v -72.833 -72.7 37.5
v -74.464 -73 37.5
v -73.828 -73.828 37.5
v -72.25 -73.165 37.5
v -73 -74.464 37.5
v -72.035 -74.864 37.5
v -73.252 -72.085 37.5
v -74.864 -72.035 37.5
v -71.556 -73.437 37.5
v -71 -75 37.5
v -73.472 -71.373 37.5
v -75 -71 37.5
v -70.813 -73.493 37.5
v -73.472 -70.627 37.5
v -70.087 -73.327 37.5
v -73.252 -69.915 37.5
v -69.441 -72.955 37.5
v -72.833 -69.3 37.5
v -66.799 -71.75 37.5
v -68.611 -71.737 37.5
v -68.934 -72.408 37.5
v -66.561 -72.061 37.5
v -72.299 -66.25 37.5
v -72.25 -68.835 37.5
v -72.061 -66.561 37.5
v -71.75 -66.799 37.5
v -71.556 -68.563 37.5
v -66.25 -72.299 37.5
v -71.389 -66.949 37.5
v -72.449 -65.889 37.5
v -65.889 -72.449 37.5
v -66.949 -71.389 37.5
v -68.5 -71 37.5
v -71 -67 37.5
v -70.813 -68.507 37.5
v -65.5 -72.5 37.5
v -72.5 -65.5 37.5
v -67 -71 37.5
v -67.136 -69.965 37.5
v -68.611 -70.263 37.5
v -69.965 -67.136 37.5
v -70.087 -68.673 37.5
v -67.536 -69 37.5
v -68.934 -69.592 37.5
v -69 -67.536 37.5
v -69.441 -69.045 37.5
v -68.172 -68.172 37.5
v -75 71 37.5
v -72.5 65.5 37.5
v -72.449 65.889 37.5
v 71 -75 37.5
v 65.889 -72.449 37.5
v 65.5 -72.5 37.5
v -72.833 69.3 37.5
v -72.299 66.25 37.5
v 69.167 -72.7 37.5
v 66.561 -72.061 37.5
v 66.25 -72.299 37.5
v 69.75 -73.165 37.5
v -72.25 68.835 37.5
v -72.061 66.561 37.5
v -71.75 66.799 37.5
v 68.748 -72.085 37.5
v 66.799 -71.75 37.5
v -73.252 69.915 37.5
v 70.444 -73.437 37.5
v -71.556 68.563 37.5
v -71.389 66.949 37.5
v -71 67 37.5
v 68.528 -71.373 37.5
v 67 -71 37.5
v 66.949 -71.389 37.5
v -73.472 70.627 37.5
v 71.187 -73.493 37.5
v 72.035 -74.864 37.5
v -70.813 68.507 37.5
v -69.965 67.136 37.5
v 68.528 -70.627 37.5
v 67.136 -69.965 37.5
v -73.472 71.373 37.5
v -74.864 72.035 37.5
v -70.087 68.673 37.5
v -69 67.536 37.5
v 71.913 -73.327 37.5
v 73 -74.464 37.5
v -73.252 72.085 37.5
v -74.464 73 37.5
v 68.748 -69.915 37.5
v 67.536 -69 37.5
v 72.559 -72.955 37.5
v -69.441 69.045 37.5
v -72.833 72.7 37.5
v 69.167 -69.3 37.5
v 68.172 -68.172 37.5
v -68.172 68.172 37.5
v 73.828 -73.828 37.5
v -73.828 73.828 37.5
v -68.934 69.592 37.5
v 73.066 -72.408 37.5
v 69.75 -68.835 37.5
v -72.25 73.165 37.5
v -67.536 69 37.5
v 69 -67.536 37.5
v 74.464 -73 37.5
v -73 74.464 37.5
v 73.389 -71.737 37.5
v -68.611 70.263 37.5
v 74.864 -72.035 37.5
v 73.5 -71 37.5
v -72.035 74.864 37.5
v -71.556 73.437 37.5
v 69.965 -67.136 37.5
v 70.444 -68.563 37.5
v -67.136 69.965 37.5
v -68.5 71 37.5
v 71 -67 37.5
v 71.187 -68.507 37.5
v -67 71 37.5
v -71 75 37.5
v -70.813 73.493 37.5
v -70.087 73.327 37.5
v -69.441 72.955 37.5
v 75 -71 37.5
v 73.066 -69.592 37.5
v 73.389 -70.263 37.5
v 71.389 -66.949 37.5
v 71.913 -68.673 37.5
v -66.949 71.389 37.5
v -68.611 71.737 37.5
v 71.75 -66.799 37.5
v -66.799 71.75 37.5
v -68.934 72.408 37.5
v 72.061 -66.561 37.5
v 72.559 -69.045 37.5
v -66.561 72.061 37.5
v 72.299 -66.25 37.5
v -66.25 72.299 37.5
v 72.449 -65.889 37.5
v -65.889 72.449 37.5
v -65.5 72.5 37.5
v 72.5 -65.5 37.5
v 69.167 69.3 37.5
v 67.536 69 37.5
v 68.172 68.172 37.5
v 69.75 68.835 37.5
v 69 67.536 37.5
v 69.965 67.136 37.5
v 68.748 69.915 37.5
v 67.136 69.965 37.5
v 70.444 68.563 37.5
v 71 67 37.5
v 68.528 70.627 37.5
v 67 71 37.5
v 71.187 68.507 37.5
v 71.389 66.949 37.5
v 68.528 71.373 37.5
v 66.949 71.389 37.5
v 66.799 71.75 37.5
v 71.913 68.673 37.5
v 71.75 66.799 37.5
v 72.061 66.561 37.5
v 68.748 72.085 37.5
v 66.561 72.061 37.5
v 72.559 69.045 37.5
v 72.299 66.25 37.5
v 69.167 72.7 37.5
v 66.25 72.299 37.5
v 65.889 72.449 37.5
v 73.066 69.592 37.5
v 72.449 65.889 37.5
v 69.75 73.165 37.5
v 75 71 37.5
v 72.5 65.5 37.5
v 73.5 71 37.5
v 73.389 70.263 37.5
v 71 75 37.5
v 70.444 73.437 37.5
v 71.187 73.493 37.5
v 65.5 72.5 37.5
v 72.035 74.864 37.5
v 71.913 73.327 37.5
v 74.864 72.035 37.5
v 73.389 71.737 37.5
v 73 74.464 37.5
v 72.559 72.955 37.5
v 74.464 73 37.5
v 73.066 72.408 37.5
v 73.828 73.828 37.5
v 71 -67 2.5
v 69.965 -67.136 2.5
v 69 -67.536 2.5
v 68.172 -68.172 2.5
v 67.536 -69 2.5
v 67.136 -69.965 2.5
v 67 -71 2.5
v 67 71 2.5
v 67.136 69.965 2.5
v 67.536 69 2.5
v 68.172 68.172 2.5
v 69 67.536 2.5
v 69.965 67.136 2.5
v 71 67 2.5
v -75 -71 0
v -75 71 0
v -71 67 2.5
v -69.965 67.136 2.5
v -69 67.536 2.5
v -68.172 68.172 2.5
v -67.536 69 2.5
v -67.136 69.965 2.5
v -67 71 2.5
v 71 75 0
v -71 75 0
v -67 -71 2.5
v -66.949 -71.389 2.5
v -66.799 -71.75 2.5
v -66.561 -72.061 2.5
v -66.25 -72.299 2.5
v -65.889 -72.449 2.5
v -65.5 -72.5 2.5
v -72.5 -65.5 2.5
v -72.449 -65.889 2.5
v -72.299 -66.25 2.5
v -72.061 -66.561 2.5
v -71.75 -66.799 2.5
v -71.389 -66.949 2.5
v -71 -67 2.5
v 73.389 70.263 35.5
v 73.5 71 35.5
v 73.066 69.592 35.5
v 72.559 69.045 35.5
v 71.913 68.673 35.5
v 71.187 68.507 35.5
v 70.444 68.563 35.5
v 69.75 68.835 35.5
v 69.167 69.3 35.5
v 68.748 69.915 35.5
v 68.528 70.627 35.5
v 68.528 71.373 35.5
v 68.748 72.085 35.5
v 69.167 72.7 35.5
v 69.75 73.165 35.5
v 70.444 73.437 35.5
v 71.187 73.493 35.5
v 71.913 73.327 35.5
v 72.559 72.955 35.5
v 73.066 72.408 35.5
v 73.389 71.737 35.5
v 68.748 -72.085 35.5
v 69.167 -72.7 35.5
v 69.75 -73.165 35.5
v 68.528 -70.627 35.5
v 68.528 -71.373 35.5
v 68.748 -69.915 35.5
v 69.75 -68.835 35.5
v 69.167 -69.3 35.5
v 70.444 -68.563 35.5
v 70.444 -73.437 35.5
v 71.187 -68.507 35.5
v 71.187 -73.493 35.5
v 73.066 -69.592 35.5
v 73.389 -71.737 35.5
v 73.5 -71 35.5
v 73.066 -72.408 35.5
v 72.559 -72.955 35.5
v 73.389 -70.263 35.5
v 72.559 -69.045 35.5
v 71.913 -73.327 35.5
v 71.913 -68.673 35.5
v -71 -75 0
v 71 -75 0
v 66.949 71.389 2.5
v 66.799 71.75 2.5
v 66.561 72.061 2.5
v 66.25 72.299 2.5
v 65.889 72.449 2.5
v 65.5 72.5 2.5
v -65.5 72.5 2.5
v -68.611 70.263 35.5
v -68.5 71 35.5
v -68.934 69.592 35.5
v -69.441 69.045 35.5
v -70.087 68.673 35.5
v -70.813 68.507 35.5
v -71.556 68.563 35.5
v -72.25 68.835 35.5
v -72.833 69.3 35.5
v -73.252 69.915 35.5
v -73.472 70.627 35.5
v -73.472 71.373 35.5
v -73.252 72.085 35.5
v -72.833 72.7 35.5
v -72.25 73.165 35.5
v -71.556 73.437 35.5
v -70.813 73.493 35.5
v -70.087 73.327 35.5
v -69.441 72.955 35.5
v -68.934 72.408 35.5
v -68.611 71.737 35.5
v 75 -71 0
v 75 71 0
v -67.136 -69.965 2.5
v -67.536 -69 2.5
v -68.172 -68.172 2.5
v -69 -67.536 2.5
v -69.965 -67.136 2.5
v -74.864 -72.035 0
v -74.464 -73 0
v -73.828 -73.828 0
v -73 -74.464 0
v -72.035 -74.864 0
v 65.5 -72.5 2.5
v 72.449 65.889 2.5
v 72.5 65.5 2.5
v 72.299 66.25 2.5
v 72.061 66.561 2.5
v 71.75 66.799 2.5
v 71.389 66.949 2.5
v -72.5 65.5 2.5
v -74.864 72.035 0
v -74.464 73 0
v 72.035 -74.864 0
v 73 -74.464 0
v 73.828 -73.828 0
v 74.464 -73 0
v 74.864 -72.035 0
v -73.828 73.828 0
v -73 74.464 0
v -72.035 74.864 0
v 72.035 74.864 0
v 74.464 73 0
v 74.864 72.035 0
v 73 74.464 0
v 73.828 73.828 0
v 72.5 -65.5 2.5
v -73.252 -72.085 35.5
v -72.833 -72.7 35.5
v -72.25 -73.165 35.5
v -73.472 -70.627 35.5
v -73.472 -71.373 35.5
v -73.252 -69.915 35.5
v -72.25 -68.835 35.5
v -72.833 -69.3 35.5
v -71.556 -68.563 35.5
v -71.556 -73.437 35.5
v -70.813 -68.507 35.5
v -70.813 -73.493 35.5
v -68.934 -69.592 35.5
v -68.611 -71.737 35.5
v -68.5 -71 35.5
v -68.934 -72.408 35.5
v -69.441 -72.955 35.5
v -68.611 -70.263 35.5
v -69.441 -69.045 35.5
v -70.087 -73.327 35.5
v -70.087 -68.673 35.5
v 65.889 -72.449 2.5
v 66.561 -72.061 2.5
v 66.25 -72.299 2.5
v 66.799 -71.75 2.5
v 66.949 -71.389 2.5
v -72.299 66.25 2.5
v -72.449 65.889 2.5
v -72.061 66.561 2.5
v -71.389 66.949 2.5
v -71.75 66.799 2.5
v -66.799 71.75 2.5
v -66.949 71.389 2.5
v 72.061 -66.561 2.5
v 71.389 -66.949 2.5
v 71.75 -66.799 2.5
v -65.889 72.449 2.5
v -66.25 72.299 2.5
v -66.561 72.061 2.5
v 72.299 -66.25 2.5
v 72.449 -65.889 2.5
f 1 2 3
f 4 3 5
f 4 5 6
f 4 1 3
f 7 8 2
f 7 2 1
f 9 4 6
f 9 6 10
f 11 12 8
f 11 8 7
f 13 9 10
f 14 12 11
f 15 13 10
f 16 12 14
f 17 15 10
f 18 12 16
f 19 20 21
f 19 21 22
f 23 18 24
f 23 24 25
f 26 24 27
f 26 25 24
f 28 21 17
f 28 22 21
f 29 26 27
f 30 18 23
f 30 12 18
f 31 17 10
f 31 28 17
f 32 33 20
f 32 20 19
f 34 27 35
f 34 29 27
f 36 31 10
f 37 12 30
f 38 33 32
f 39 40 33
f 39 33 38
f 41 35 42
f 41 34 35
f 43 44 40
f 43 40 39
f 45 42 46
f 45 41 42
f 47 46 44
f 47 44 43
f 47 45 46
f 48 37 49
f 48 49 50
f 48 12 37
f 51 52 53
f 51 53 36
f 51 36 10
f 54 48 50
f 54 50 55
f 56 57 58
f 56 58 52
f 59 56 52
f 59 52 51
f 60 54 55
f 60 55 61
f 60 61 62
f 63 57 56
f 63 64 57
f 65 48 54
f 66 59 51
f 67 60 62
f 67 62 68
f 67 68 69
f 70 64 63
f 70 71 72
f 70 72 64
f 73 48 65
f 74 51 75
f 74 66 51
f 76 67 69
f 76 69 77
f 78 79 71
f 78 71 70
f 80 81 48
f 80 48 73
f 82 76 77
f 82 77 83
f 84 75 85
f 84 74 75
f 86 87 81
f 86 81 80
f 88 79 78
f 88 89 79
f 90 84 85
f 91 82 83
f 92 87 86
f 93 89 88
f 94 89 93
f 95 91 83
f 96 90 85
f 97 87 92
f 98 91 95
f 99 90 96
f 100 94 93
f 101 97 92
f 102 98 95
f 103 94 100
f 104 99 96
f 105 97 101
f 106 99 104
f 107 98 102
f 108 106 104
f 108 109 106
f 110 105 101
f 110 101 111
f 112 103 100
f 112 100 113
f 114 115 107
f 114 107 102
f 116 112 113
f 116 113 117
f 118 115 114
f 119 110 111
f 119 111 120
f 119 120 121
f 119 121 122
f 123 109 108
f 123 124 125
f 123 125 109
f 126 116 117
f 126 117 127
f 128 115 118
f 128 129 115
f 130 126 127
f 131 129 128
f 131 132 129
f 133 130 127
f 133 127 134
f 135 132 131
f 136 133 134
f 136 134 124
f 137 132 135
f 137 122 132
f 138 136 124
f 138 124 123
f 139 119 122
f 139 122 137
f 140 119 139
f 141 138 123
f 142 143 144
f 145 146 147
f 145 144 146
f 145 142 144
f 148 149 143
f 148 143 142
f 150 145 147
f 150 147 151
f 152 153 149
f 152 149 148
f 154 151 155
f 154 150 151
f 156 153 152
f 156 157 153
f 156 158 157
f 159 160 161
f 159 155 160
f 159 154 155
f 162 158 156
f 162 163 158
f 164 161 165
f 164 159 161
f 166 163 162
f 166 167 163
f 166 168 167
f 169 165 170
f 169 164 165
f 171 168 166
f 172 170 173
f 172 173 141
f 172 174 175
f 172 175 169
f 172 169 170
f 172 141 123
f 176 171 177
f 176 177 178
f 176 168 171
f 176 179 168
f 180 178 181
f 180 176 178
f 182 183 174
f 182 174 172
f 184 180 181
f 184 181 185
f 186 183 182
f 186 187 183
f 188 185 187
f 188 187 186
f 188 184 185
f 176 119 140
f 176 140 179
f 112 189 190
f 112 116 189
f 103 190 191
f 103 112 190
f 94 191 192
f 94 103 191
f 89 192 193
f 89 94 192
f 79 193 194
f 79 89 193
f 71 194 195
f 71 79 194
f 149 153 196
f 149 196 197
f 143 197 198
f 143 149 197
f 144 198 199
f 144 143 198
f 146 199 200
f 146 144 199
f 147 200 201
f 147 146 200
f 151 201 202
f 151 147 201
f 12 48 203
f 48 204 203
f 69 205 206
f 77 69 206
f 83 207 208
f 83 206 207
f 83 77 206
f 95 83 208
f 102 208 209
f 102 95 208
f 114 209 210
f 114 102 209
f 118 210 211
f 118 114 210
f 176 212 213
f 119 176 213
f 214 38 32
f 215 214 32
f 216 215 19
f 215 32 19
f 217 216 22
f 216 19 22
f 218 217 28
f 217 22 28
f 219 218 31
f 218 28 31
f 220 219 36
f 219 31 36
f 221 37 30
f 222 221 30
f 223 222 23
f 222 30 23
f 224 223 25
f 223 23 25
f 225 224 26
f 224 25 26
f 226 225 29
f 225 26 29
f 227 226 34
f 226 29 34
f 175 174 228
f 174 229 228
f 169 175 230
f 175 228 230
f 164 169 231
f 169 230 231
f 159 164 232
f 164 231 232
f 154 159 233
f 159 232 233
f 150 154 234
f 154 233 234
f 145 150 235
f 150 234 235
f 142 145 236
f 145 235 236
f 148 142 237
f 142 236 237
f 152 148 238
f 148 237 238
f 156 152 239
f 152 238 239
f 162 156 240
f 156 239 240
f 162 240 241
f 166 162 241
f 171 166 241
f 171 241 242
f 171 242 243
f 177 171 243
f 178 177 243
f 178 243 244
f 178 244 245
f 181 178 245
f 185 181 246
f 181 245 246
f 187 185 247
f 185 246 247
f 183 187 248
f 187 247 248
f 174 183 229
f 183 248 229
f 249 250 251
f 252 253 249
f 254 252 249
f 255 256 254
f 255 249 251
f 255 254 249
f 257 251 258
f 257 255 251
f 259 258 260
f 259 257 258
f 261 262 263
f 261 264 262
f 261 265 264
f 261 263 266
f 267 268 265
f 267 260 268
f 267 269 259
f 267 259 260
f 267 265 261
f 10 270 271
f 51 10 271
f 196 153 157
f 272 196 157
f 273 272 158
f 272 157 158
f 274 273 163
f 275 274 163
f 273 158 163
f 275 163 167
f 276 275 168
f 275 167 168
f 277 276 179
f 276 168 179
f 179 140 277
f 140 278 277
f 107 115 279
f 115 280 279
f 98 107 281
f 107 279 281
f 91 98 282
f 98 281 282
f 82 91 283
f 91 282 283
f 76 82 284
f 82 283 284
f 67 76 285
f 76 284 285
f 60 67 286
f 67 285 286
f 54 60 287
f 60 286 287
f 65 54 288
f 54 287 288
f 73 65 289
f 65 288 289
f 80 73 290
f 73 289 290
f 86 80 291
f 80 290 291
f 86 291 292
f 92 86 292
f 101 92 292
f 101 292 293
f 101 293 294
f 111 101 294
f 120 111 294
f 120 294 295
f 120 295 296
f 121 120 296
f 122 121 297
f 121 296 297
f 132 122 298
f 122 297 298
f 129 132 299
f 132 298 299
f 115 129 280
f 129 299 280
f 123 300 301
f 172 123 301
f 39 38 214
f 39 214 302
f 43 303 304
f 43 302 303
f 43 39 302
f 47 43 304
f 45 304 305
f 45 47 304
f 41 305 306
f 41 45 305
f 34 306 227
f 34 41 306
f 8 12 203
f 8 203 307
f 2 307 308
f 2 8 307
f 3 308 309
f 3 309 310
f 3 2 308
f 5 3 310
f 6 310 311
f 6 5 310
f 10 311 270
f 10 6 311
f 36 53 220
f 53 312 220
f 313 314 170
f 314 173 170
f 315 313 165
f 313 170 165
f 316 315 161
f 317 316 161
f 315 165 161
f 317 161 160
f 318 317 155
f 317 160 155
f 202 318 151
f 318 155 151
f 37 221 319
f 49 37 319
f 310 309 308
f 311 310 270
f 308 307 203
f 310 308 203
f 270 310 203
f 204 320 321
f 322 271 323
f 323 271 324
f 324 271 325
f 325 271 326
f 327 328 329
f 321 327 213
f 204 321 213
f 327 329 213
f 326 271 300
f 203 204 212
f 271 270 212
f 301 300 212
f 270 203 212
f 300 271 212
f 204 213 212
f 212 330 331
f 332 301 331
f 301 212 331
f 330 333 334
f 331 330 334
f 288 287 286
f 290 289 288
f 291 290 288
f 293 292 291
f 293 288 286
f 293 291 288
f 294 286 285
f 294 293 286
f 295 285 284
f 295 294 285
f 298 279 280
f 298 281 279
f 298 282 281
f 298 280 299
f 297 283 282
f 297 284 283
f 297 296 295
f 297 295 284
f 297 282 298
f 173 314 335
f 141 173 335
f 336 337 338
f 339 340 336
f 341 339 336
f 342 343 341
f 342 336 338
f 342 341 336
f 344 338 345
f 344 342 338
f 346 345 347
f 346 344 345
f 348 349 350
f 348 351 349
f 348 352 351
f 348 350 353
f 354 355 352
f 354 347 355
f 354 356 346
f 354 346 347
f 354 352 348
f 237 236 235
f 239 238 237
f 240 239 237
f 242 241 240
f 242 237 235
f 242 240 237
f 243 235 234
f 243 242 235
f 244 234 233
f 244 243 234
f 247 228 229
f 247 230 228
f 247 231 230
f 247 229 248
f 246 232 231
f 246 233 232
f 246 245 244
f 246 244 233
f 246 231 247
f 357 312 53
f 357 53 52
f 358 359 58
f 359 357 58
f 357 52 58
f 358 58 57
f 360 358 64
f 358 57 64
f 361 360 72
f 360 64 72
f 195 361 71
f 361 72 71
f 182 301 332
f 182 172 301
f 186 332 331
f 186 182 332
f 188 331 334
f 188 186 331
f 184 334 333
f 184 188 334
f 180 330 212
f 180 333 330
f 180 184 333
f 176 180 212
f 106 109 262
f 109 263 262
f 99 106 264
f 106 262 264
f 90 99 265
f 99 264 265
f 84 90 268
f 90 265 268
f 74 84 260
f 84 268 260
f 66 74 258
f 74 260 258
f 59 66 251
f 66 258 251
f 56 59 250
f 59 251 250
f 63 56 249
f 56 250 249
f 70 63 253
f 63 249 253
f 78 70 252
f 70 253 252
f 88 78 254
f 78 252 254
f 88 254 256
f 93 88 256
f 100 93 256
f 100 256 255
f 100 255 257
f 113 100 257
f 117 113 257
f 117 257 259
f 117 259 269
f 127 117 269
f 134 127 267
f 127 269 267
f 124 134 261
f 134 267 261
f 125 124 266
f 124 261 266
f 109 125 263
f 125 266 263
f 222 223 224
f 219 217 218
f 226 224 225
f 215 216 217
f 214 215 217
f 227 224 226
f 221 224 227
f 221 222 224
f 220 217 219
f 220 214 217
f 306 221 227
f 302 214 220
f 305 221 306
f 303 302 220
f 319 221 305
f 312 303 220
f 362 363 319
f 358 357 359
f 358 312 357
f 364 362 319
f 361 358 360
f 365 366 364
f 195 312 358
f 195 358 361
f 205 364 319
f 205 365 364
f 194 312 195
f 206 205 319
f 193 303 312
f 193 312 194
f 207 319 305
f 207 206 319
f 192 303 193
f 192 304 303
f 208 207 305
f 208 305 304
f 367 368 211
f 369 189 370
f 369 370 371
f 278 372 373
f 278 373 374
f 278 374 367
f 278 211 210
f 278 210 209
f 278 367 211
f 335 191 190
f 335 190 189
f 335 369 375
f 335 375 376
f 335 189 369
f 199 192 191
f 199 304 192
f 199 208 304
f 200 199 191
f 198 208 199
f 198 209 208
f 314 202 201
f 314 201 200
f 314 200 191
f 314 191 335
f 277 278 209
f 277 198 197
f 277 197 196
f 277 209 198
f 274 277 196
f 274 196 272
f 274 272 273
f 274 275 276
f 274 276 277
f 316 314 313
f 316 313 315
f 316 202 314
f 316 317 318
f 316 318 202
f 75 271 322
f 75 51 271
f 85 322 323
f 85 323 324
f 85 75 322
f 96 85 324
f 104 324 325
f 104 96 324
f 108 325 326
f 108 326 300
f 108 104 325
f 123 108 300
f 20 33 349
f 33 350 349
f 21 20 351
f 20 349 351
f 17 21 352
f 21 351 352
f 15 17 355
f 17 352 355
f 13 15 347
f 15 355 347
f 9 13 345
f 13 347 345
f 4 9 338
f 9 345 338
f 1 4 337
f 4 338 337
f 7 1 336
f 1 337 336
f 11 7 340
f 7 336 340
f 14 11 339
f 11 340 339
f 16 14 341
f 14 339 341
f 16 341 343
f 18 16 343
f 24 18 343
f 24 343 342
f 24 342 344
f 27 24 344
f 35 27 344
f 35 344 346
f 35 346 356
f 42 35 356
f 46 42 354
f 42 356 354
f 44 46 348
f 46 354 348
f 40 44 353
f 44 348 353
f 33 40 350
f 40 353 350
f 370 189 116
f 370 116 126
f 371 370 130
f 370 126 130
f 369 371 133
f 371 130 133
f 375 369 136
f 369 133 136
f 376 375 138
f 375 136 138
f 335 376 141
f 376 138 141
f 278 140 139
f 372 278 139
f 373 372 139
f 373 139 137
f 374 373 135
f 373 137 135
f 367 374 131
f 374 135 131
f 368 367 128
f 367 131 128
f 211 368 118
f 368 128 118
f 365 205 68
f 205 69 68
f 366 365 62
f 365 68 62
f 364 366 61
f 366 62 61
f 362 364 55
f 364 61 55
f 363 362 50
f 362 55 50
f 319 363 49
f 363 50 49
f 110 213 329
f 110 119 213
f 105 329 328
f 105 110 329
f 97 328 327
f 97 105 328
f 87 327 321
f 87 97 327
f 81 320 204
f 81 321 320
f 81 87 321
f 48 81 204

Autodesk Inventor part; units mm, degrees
ref_plane "YZ Plane" through (0, 0, 0) normal (1, 0, 0) x (0, 1, 0)
ref_plane "XZ Plane" through (0, 0, 0) normal (0, 1, 0) x (-1, 0, 0)
ref_plane "XY Plane" through (0, 0, 0) normal (0, 0, 1) x (1, 0, 0)
sketch "Sketch1" plane through (0, 0, 0) normal (0, 0, 1) x (1, 0, 0)
  line L0 (-75, -75) -> (75, -75)
  line L1 (75, -75) -> (75, 75)
  line L2 (75, 75) -> (-75, 75)
  line L3 (-75, 75) -> (-75, -75)
  line L4 (-75, -75) -> (75, 75) construction
  line L5 (75, -75) -> (-75, 75) construction
  line L6 (72.5, -72.5) -> (-72.5, -72.5)
  line L7 (-72.5, -72.5) -> (-72.5, 72.5)
  line L8 (-72.5, 72.5) -> (72.5, 72.5)
  line L9 (72.5, 72.5) -> (72.5, -72.5)
  line L10 (72.5, -72.5) -> (-72.5, 72.5) construction
  line L11 (-72.5, -72.5) -> (72.5, 72.5) construction
  line L12 (-75, 75) -> (-71, 75) construction
  line L13 (-71, 75) -> (-71, 71) construction
  line L14 (-71, 71) -> (-75, 71) construction
  line L15 (-75, 71) -> (-75, 75) construction
  circle A0 centre (-71, 71) radius 2.5
  line L16 (-71, -71) -> (-71, -75) construction
  line L17 (-75, -71) -> (-71, -71) construction
  circle A1 centre (-71, -71) radius 2.5
  line L18 (72.5, 72.5) -> (-72.5, -72.5) construction
  line L19 (75, 75) -> (-75, -75) construction
  line L20 (71, -71) -> (75, -71) construction
  line L21 (71, -75) -> (71, -71) construction
  circle A2 centre (71, -71) radius 2.5
  line L22 (-72.5, 72.5) -> (72.5, -72.5) construction
  line L23 (-75, 75) -> (75, -75) construction
  line L24 (71, 71) -> (71, 75) construction
  line L25 (75, 71) -> (71, 71) construction
  circle A3 centre (71, 71) radius 2.5
  line L26 (-72.5, -72.5) -> (72.5, 72.5) construction
  line L27 (-75, -75) -> (75, 75) construction
  line L28 (-73.5, 73.5) -> (-68.5, 73.5)
  line L29 (-68.5, 73.5) -> (-68.5, 68.5)
  line L30 (-68.5, 68.5) -> (-73.5, 68.5)
  line L31 (-73.5, 68.5) -> (-73.5, 73.5)
  line L32 (-73.5, 73.5) -> (-68.5, 68.5) construction
  line L33 (-68.5, 73.5) -> (-73.5, 68.5) construction
  line L34 (-72.5, -72.5) -> (72.5, 72.5) construction
  line L35 (72.5, 72.5) -> (-72.5, -72.5) construction
  line L36 (-75, -75) -> (75, 75) construction
  line L37 (75, 75) -> (-75, -75) construction
  line L38 (-73.5, -68.5) -> (-68.5, -68.5)
  line L39 (-73.5, -73.5) -> (-68.5, -68.5) construction
  line L40 (-68.5, -68.5) -> (-68.5, -73.5)
  line L41 (-68.5, -73.5) -> (-73.5, -73.5)
  line L42 (-73.5, -73.5) -> (-73.5, -68.5)
  line L43 (72.5, -72.5) -> (-72.5, 72.5) construction
  line L44 (-72.5, 72.5) -> (72.5, -72.5) construction
  line L45 (75, -75) -> (-75, 75) construction
  line L46 (-75, 75) -> (75, -75) construction
  line L47 (68.5, -73.5) -> (68.5, -68.5)
  line L48 (73.5, -73.5) -> (68.5, -68.5) construction
  line L49 (68.5, -68.5) -> (73.5, -68.5)
  line L50 (73.5, -68.5) -> (73.5, -73.5)
  line L51 (73.5, -73.5) -> (68.5, -73.5)
  line L52 (72.5, 72.5) -> (-72.5, -72.5) construction
  line L53 (-72.5, -72.5) -> (72.5, 72.5) construction
  line L54 (75, 75) -> (-75, -75) construction
  line L55 (-75, -75) -> (75, 75) construction
  line L56 (73.5, 68.5) -> (68.5, 68.5)
  line L57 (73.5, 73.5) -> (68.5, 68.5) construction
  line L58 (68.5, 68.5) -> (68.5, 73.5)
  line L59 (68.5, 73.5) -> (73.5, 73.5)
  line L60 (73.5, 73.5) -> (73.5, 68.5)
  line L61 (-72.5, 68.5) -> (-72.5, 67)
  line L62 (-72.5, 67) -> (-67, 67)
  line L63 (-67, 67) -> (-67, 72.5)
  line L64 (-67, 72.5) -> (-68.5, 72.5)
  line L65 (-68.5, 72.5) -> (-68.5, 68.5)
  line L66 (-68.5, 68.5) -> (-72.5, 68.5)
  line L67 (-67, -67) -> (-72.5, -67)
  line L68 (-67, -72.5) -> (-67, -67)
  line L69 (72.5, 72.5) -> (-72.5, -72.5) construction
  line L70 (72.5, 72.5) -> (-72.5, -72.5) construction
  line L71 (-72.5, -72.5) -> (72.5, 72.5) construction
  line L72 (-72.5, -72.5) -> (72.5, 72.5) construction
  line L73 (-75, -75) -> (75, 75) construction
  line L74 (-75, -75) -> (75, 75) construction
  line L75 (75, 75) -> (-75, -75) construction
  line L76 (75, 75) -> (-75, -75) construction
  line L77 (67, -67) -> (67, -72.5)
  line L78 (72.5, -67) -> (67, -67)
  line L79 (-72.5, 72.5) -> (72.5, -72.5) construction
  line L80 (-72.5, 72.5) -> (72.5, -72.5) construction
  line L81 (72.5, -72.5) -> (-72.5, 72.5) construction
  line L82 (72.5, -72.5) -> (-72.5, 72.5) construction
  line L83 (75, -75) -> (-75, 75) construction
  line L84 (75, -75) -> (-75, 75) construction
  line L85 (-75, 75) -> (75, -75) construction
  line L86 (-75, 75) -> (75, -75) construction
  line L87 (67, 67) -> (72.5, 67)
  line L88 (67, 72.5) -> (67, 67)
  line L89 (-72.5, -72.5) -> (72.5, 72.5) construction
  line L90 (-72.5, -72.5) -> (72.5, 72.5) construction
  line L91 (72.5, 72.5) -> (-72.5, -72.5) construction
  line L92 (72.5, 72.5) -> (-72.5, -72.5) construction
  line L93 (75, 75) -> (-75, -75) construction
  line L94 (75, 75) -> (-75, -75) construction
  line L95 (-75, -75) -> (75, 75) construction
  line L96 (-75, -75) -> (75, 75) construction
  line L97 (-72.5, -67) -> (-72.5, -68.5)
  line L98 (-72.5, -68.5) -> (-68.5, -68.5)
  line L99 (-68.5, -68.5) -> (-68.5, -72.5)
  line L100 (-68.5, -72.5) -> (-67, -72.5)
  line L101 (-67, -72.5) -> (-67, -67)
  line L102 (-67, -67) -> (-72.5, -67)
  line L103 (68.5, -72.5) -> (67, -72.5)
  line L104 (67, -72.5) -> (67, -67)
  line L105 (67, -67) -> (72.5, -67)
  line L106 (72.5, -67) -> (72.5, -68.5)
  line L107 (72.5, -68.5) -> (68.5, -68.5)
  line L108 (68.5, -68.5) -> (68.5, -72.5)
  line L109 (67, 72.5) -> (68.5, 72.5)
  line L110 (68.5, 72.5) -> (68.5, 68.5)
  line L111 (68.5, 68.5) -> (72.5, 68.5)
  line L112 (72.5, 68.5) -> (72.5, 67)
  line L113 (72.5, 67) -> (67, 67)
  line L114 (67, 67) -> (67, 72.5)
  point P0 (0, 0)
  point P1 (0, 0)
  point P2 (0, 0)
  point P3 (0, 0)
  point P4 (0, 0)
  point P5 (0, 0)
  point P6 (0, 0)
  point P7 (0, 0)
  point P8 (0, 0)
  point P9 (0, 0)
  point P10 (0, 0)
  point P11 (0, 0)
  point P12 (0, 0)
  point P13 (0, 0)
  point P14 (0, 0)
  point P15 (0, 0)
  point P16 (0, 0)
  point P17 (0, 0)
  point P18 (-68.5, 68.5)
  point P19 (0, 0)
  point P20 (0, 0)
  point P21 (0, 0)
  point P22 (0, 0)
  point P23 (-68.5, -68.5)
  dimension "d0" = 150
  dimension "d1" = 150
  dimension "d2" = 145
  dimension "d3" = 145
  dimension "d8" = 4
  dimension "d9" = 4
  dimension "d10" = 5
  dimension "d13" = 360
  dimension "d17" = 360
  dimension "d25" = 1.5
  dimension "d28" = 360
extrude "Extrusion1" add sketch "Sketch1" along normal blind 2.5 contours L47 A2 L6 | L6 L77 L78 L9 L49 L47 | L6 L68 L67 L7 L62 L63 L8 L88 L87 L9 L78 L77 | A2 L9 L6 | L47 L49 A2 | L6 L40 L38 L7 L67 L68 | L49 L9 A2 | L6 A1 L40 | L6 L7 A1 | A1 L38 L40 | L87 L88 L8 L58 L56 L9 | A1 L7 L38 | L7 L30 L29 L8 L63 L62 | L56 A3 L9 | L7 A0 L30 | A3 L8 L9 | L56 L58 A3 | L7 L8 A0 | A0 L29 L30 | L58 L8 A3 | A0 L8 L29 picked at (70.3289, -70.3289) picked at (-70.3289, -70.3289) picked at (70.3289, 70.3289) picked at (-70.3289, 70.3289)
extrude "Extrusion2" add sketch "Sketch1" along normal blind 37.5 contours L3 L2 L1 L0 | L6 A2 L51 L47 | L6 L9 A2 | A2 L50 L51 | L40 L41 A1 L6 | L9 L49 L50 A2 | A1 L7 L6 | L41 L42 A1 | L7 A1 L42 L38 | L9 A3 L60 L56 | L30 L31 A0 L7 | L9 L8 A3 | A0 L8 L7 | A3 L59 L60 | L58 L59 A3 L8 | L31 L28 A0 | L8 A0 L28 L29 picked at (72.6398, -70.2994) picked at (-72.6398, -70.2994) picked at (72.6398, 70.2994) picked at (-72.6398, 70.2994)
extrude "Extrusion3" add sketch "Sketch1" along normal blind 37.5 contours L47 A2 L6 | L6 A2 L51 L47 | A2 L9 L6 | L6 L9 A2 | L47 L49 A2 | A2 L50 L51 | L49 L9 A2 | L40 L41 A1 L6 | L6 A1 L40 | L9 L49 L50 A2 | A1 L7 L6 | L6 L7 A1 | A1 L38 L40 | L41 L42 A1 | A1 L7 L38 | L7 A1 L42 L38 | L56 A3 L9 | L9 A3 L60 L56 | L30 L31 A0 L7 | L7 A0 L30 | A3 L8 L9 | L9 L8 A3 | L56 L58 A3 | A0 L8 L7 | L7 L8 A0 | A0 L29 L30 | A3 L59 L60 | L58 L8 A3 | L58 L59 A3 L8 | L31 L28 A0 | A0 L8 L29 | L8 A0 L28 L29
extrude "Extrusion4" cut sketch "Sketch1" along normal blind 37.5 contours A2 L9 L6 | L6 L9 A2 | A1 L7 L6 | L6 L7 A1 | A3 L8 L9 | L9 L8 A3 | A0 L8 L7 | L7 L8 A0
extrude "Extrusion5" add sketch "Sketch1" along normal blind 35.5 contours A2 L9 L6 | L6 L9 A2 | A1 L7 L6 | L6 L7 A1 | A3 L8 L9 | L9 L8 A3 | A0 L8 L7 | L7 L8 A0
extrude "Extrusion6" add sketch "Sketch1" along normal blind 37.5 contours L47 A2 L6 | L6 A2 L51 L47 | L6 L77 L78 L9 L49 L47 | L6 L68 L67 L7 L62 L63 L8 L88 L87 L9 L78 L77 | A2 L9 L6 | L6 L9 A2 | L47 L49 A2 | L6 L40 L38 L7 L67 L68 | A2 L50 L51 | L49 L9 A2 | L40 L41 A1 L6 | L6 A1 L40 | L9 L49 L50 A2 | A1 L7 L6 | L6 L7 A1 | A1 L38 L40 | L87 L88 L8 L58 L56 L9 | L41 L42 A1 | A1 L7 L38 | L7 A1 L42 L38 | L7 L30 L29 L8 L63 L62 | L56 A3 L9 | L9 A3 L60 L56 | L30 L31 A0 L7 | L7 A0 L30 | A3 L8 L9 | L9 L8 A3 | L56 L58 A3 | A0 L8 L7 | L7 L8 A0 | A0 L29 L30 | A3 L59 L60 | L58 L8 A3 | L58 L59 A3 L8 | L31 L28 A0 | A0 L8 L29 | L8 A0 L28 L29
extrude "Extrusion7" cut sketch "Sketch1" along normal blind 37.5 contours L6 L68 L67 L7 L62 L63 L8 L88 L87 L9 L78 L77 | A2 L9 L6 | L6 L9 A2 | A1 L7 L6 | L6 L7 A1 | A3 L8 L9 | L9 L8 A3 | A0 L8 L7 | L7 L8 A0
extrude "Extrusion8" add sketch "Sketch1" along normal blind 2.5 contours L47 A2 L6 | L6 A2 L51 L47 | L6 L77 L78 L9 L49 L47 | L6 L68 L67 L7 L62 L63 L8 L88 L87 L9 L78 L77 | A2 L9 L6 | L6 L9 A2 | L47 L49 A2 | L6 L40 L38 L7 L67 L68 | A2 L50 L51 | L49 L9 A2 | L40 L41 A1 L6 | L6 A1 L40 | L9 L49 L50 A2 | A1 L7 L6 | L6 L7 A1 | A1 L38 L40 | L87 L88 L8 L58 L56 L9 | L41 L42 A1 | A1 L7 L38 | L7 A1 L42 L38 | L7 L30 L29 L8 L63 L62 | L56 A3 L9 | L9 A3 L60 L56 | L30 L31 A0 L7 | L7 A0 L30 | A3 L8 L9 | L9 L8 A3 | L56 L58 A3 | A0 L8 L7 | L7 L8 A0 | A0 L29 L30 | A3 L59 L60 | L58 L8 A3 | L58 L59 A3 L8 | L31 L28 A0 | A0 L8 L29 | L8 A0 L28 L29
extrude "Extrusion9" add sketch "Sketch1" along normal blind 35.5 contours A2 L9 L6 | L6 L9 A2 | A1 L7 L6 | L6 L7 A1 | A3 L8 L9 | L9 L8 A3 | A0 L8 L7 | L7 L8 A0
fillet "Fillet1" radius 4 4 edges at (-75, -75, 18.75) (75, -75, 18.75) (75, 75, 18.75) (-75, 75, 18.75)
fillet "Fillet2" radius 4 4 edges at (-67, 67, 20) (-67, -67, 20) (67, 67, 20) (67, -67, 20)
fillet "Fillet3" radius 1.5 8 edges at (-67, 72.5, 20) (-72.5, 67, 20) (67, 72.5, 20) (72.5, 67, 20) (67, -72.5, 20) (72.5, -67, 20) (-72.5, -67, 20) (-67, -72.5, 20)
properties part number "electronics_box_small"
